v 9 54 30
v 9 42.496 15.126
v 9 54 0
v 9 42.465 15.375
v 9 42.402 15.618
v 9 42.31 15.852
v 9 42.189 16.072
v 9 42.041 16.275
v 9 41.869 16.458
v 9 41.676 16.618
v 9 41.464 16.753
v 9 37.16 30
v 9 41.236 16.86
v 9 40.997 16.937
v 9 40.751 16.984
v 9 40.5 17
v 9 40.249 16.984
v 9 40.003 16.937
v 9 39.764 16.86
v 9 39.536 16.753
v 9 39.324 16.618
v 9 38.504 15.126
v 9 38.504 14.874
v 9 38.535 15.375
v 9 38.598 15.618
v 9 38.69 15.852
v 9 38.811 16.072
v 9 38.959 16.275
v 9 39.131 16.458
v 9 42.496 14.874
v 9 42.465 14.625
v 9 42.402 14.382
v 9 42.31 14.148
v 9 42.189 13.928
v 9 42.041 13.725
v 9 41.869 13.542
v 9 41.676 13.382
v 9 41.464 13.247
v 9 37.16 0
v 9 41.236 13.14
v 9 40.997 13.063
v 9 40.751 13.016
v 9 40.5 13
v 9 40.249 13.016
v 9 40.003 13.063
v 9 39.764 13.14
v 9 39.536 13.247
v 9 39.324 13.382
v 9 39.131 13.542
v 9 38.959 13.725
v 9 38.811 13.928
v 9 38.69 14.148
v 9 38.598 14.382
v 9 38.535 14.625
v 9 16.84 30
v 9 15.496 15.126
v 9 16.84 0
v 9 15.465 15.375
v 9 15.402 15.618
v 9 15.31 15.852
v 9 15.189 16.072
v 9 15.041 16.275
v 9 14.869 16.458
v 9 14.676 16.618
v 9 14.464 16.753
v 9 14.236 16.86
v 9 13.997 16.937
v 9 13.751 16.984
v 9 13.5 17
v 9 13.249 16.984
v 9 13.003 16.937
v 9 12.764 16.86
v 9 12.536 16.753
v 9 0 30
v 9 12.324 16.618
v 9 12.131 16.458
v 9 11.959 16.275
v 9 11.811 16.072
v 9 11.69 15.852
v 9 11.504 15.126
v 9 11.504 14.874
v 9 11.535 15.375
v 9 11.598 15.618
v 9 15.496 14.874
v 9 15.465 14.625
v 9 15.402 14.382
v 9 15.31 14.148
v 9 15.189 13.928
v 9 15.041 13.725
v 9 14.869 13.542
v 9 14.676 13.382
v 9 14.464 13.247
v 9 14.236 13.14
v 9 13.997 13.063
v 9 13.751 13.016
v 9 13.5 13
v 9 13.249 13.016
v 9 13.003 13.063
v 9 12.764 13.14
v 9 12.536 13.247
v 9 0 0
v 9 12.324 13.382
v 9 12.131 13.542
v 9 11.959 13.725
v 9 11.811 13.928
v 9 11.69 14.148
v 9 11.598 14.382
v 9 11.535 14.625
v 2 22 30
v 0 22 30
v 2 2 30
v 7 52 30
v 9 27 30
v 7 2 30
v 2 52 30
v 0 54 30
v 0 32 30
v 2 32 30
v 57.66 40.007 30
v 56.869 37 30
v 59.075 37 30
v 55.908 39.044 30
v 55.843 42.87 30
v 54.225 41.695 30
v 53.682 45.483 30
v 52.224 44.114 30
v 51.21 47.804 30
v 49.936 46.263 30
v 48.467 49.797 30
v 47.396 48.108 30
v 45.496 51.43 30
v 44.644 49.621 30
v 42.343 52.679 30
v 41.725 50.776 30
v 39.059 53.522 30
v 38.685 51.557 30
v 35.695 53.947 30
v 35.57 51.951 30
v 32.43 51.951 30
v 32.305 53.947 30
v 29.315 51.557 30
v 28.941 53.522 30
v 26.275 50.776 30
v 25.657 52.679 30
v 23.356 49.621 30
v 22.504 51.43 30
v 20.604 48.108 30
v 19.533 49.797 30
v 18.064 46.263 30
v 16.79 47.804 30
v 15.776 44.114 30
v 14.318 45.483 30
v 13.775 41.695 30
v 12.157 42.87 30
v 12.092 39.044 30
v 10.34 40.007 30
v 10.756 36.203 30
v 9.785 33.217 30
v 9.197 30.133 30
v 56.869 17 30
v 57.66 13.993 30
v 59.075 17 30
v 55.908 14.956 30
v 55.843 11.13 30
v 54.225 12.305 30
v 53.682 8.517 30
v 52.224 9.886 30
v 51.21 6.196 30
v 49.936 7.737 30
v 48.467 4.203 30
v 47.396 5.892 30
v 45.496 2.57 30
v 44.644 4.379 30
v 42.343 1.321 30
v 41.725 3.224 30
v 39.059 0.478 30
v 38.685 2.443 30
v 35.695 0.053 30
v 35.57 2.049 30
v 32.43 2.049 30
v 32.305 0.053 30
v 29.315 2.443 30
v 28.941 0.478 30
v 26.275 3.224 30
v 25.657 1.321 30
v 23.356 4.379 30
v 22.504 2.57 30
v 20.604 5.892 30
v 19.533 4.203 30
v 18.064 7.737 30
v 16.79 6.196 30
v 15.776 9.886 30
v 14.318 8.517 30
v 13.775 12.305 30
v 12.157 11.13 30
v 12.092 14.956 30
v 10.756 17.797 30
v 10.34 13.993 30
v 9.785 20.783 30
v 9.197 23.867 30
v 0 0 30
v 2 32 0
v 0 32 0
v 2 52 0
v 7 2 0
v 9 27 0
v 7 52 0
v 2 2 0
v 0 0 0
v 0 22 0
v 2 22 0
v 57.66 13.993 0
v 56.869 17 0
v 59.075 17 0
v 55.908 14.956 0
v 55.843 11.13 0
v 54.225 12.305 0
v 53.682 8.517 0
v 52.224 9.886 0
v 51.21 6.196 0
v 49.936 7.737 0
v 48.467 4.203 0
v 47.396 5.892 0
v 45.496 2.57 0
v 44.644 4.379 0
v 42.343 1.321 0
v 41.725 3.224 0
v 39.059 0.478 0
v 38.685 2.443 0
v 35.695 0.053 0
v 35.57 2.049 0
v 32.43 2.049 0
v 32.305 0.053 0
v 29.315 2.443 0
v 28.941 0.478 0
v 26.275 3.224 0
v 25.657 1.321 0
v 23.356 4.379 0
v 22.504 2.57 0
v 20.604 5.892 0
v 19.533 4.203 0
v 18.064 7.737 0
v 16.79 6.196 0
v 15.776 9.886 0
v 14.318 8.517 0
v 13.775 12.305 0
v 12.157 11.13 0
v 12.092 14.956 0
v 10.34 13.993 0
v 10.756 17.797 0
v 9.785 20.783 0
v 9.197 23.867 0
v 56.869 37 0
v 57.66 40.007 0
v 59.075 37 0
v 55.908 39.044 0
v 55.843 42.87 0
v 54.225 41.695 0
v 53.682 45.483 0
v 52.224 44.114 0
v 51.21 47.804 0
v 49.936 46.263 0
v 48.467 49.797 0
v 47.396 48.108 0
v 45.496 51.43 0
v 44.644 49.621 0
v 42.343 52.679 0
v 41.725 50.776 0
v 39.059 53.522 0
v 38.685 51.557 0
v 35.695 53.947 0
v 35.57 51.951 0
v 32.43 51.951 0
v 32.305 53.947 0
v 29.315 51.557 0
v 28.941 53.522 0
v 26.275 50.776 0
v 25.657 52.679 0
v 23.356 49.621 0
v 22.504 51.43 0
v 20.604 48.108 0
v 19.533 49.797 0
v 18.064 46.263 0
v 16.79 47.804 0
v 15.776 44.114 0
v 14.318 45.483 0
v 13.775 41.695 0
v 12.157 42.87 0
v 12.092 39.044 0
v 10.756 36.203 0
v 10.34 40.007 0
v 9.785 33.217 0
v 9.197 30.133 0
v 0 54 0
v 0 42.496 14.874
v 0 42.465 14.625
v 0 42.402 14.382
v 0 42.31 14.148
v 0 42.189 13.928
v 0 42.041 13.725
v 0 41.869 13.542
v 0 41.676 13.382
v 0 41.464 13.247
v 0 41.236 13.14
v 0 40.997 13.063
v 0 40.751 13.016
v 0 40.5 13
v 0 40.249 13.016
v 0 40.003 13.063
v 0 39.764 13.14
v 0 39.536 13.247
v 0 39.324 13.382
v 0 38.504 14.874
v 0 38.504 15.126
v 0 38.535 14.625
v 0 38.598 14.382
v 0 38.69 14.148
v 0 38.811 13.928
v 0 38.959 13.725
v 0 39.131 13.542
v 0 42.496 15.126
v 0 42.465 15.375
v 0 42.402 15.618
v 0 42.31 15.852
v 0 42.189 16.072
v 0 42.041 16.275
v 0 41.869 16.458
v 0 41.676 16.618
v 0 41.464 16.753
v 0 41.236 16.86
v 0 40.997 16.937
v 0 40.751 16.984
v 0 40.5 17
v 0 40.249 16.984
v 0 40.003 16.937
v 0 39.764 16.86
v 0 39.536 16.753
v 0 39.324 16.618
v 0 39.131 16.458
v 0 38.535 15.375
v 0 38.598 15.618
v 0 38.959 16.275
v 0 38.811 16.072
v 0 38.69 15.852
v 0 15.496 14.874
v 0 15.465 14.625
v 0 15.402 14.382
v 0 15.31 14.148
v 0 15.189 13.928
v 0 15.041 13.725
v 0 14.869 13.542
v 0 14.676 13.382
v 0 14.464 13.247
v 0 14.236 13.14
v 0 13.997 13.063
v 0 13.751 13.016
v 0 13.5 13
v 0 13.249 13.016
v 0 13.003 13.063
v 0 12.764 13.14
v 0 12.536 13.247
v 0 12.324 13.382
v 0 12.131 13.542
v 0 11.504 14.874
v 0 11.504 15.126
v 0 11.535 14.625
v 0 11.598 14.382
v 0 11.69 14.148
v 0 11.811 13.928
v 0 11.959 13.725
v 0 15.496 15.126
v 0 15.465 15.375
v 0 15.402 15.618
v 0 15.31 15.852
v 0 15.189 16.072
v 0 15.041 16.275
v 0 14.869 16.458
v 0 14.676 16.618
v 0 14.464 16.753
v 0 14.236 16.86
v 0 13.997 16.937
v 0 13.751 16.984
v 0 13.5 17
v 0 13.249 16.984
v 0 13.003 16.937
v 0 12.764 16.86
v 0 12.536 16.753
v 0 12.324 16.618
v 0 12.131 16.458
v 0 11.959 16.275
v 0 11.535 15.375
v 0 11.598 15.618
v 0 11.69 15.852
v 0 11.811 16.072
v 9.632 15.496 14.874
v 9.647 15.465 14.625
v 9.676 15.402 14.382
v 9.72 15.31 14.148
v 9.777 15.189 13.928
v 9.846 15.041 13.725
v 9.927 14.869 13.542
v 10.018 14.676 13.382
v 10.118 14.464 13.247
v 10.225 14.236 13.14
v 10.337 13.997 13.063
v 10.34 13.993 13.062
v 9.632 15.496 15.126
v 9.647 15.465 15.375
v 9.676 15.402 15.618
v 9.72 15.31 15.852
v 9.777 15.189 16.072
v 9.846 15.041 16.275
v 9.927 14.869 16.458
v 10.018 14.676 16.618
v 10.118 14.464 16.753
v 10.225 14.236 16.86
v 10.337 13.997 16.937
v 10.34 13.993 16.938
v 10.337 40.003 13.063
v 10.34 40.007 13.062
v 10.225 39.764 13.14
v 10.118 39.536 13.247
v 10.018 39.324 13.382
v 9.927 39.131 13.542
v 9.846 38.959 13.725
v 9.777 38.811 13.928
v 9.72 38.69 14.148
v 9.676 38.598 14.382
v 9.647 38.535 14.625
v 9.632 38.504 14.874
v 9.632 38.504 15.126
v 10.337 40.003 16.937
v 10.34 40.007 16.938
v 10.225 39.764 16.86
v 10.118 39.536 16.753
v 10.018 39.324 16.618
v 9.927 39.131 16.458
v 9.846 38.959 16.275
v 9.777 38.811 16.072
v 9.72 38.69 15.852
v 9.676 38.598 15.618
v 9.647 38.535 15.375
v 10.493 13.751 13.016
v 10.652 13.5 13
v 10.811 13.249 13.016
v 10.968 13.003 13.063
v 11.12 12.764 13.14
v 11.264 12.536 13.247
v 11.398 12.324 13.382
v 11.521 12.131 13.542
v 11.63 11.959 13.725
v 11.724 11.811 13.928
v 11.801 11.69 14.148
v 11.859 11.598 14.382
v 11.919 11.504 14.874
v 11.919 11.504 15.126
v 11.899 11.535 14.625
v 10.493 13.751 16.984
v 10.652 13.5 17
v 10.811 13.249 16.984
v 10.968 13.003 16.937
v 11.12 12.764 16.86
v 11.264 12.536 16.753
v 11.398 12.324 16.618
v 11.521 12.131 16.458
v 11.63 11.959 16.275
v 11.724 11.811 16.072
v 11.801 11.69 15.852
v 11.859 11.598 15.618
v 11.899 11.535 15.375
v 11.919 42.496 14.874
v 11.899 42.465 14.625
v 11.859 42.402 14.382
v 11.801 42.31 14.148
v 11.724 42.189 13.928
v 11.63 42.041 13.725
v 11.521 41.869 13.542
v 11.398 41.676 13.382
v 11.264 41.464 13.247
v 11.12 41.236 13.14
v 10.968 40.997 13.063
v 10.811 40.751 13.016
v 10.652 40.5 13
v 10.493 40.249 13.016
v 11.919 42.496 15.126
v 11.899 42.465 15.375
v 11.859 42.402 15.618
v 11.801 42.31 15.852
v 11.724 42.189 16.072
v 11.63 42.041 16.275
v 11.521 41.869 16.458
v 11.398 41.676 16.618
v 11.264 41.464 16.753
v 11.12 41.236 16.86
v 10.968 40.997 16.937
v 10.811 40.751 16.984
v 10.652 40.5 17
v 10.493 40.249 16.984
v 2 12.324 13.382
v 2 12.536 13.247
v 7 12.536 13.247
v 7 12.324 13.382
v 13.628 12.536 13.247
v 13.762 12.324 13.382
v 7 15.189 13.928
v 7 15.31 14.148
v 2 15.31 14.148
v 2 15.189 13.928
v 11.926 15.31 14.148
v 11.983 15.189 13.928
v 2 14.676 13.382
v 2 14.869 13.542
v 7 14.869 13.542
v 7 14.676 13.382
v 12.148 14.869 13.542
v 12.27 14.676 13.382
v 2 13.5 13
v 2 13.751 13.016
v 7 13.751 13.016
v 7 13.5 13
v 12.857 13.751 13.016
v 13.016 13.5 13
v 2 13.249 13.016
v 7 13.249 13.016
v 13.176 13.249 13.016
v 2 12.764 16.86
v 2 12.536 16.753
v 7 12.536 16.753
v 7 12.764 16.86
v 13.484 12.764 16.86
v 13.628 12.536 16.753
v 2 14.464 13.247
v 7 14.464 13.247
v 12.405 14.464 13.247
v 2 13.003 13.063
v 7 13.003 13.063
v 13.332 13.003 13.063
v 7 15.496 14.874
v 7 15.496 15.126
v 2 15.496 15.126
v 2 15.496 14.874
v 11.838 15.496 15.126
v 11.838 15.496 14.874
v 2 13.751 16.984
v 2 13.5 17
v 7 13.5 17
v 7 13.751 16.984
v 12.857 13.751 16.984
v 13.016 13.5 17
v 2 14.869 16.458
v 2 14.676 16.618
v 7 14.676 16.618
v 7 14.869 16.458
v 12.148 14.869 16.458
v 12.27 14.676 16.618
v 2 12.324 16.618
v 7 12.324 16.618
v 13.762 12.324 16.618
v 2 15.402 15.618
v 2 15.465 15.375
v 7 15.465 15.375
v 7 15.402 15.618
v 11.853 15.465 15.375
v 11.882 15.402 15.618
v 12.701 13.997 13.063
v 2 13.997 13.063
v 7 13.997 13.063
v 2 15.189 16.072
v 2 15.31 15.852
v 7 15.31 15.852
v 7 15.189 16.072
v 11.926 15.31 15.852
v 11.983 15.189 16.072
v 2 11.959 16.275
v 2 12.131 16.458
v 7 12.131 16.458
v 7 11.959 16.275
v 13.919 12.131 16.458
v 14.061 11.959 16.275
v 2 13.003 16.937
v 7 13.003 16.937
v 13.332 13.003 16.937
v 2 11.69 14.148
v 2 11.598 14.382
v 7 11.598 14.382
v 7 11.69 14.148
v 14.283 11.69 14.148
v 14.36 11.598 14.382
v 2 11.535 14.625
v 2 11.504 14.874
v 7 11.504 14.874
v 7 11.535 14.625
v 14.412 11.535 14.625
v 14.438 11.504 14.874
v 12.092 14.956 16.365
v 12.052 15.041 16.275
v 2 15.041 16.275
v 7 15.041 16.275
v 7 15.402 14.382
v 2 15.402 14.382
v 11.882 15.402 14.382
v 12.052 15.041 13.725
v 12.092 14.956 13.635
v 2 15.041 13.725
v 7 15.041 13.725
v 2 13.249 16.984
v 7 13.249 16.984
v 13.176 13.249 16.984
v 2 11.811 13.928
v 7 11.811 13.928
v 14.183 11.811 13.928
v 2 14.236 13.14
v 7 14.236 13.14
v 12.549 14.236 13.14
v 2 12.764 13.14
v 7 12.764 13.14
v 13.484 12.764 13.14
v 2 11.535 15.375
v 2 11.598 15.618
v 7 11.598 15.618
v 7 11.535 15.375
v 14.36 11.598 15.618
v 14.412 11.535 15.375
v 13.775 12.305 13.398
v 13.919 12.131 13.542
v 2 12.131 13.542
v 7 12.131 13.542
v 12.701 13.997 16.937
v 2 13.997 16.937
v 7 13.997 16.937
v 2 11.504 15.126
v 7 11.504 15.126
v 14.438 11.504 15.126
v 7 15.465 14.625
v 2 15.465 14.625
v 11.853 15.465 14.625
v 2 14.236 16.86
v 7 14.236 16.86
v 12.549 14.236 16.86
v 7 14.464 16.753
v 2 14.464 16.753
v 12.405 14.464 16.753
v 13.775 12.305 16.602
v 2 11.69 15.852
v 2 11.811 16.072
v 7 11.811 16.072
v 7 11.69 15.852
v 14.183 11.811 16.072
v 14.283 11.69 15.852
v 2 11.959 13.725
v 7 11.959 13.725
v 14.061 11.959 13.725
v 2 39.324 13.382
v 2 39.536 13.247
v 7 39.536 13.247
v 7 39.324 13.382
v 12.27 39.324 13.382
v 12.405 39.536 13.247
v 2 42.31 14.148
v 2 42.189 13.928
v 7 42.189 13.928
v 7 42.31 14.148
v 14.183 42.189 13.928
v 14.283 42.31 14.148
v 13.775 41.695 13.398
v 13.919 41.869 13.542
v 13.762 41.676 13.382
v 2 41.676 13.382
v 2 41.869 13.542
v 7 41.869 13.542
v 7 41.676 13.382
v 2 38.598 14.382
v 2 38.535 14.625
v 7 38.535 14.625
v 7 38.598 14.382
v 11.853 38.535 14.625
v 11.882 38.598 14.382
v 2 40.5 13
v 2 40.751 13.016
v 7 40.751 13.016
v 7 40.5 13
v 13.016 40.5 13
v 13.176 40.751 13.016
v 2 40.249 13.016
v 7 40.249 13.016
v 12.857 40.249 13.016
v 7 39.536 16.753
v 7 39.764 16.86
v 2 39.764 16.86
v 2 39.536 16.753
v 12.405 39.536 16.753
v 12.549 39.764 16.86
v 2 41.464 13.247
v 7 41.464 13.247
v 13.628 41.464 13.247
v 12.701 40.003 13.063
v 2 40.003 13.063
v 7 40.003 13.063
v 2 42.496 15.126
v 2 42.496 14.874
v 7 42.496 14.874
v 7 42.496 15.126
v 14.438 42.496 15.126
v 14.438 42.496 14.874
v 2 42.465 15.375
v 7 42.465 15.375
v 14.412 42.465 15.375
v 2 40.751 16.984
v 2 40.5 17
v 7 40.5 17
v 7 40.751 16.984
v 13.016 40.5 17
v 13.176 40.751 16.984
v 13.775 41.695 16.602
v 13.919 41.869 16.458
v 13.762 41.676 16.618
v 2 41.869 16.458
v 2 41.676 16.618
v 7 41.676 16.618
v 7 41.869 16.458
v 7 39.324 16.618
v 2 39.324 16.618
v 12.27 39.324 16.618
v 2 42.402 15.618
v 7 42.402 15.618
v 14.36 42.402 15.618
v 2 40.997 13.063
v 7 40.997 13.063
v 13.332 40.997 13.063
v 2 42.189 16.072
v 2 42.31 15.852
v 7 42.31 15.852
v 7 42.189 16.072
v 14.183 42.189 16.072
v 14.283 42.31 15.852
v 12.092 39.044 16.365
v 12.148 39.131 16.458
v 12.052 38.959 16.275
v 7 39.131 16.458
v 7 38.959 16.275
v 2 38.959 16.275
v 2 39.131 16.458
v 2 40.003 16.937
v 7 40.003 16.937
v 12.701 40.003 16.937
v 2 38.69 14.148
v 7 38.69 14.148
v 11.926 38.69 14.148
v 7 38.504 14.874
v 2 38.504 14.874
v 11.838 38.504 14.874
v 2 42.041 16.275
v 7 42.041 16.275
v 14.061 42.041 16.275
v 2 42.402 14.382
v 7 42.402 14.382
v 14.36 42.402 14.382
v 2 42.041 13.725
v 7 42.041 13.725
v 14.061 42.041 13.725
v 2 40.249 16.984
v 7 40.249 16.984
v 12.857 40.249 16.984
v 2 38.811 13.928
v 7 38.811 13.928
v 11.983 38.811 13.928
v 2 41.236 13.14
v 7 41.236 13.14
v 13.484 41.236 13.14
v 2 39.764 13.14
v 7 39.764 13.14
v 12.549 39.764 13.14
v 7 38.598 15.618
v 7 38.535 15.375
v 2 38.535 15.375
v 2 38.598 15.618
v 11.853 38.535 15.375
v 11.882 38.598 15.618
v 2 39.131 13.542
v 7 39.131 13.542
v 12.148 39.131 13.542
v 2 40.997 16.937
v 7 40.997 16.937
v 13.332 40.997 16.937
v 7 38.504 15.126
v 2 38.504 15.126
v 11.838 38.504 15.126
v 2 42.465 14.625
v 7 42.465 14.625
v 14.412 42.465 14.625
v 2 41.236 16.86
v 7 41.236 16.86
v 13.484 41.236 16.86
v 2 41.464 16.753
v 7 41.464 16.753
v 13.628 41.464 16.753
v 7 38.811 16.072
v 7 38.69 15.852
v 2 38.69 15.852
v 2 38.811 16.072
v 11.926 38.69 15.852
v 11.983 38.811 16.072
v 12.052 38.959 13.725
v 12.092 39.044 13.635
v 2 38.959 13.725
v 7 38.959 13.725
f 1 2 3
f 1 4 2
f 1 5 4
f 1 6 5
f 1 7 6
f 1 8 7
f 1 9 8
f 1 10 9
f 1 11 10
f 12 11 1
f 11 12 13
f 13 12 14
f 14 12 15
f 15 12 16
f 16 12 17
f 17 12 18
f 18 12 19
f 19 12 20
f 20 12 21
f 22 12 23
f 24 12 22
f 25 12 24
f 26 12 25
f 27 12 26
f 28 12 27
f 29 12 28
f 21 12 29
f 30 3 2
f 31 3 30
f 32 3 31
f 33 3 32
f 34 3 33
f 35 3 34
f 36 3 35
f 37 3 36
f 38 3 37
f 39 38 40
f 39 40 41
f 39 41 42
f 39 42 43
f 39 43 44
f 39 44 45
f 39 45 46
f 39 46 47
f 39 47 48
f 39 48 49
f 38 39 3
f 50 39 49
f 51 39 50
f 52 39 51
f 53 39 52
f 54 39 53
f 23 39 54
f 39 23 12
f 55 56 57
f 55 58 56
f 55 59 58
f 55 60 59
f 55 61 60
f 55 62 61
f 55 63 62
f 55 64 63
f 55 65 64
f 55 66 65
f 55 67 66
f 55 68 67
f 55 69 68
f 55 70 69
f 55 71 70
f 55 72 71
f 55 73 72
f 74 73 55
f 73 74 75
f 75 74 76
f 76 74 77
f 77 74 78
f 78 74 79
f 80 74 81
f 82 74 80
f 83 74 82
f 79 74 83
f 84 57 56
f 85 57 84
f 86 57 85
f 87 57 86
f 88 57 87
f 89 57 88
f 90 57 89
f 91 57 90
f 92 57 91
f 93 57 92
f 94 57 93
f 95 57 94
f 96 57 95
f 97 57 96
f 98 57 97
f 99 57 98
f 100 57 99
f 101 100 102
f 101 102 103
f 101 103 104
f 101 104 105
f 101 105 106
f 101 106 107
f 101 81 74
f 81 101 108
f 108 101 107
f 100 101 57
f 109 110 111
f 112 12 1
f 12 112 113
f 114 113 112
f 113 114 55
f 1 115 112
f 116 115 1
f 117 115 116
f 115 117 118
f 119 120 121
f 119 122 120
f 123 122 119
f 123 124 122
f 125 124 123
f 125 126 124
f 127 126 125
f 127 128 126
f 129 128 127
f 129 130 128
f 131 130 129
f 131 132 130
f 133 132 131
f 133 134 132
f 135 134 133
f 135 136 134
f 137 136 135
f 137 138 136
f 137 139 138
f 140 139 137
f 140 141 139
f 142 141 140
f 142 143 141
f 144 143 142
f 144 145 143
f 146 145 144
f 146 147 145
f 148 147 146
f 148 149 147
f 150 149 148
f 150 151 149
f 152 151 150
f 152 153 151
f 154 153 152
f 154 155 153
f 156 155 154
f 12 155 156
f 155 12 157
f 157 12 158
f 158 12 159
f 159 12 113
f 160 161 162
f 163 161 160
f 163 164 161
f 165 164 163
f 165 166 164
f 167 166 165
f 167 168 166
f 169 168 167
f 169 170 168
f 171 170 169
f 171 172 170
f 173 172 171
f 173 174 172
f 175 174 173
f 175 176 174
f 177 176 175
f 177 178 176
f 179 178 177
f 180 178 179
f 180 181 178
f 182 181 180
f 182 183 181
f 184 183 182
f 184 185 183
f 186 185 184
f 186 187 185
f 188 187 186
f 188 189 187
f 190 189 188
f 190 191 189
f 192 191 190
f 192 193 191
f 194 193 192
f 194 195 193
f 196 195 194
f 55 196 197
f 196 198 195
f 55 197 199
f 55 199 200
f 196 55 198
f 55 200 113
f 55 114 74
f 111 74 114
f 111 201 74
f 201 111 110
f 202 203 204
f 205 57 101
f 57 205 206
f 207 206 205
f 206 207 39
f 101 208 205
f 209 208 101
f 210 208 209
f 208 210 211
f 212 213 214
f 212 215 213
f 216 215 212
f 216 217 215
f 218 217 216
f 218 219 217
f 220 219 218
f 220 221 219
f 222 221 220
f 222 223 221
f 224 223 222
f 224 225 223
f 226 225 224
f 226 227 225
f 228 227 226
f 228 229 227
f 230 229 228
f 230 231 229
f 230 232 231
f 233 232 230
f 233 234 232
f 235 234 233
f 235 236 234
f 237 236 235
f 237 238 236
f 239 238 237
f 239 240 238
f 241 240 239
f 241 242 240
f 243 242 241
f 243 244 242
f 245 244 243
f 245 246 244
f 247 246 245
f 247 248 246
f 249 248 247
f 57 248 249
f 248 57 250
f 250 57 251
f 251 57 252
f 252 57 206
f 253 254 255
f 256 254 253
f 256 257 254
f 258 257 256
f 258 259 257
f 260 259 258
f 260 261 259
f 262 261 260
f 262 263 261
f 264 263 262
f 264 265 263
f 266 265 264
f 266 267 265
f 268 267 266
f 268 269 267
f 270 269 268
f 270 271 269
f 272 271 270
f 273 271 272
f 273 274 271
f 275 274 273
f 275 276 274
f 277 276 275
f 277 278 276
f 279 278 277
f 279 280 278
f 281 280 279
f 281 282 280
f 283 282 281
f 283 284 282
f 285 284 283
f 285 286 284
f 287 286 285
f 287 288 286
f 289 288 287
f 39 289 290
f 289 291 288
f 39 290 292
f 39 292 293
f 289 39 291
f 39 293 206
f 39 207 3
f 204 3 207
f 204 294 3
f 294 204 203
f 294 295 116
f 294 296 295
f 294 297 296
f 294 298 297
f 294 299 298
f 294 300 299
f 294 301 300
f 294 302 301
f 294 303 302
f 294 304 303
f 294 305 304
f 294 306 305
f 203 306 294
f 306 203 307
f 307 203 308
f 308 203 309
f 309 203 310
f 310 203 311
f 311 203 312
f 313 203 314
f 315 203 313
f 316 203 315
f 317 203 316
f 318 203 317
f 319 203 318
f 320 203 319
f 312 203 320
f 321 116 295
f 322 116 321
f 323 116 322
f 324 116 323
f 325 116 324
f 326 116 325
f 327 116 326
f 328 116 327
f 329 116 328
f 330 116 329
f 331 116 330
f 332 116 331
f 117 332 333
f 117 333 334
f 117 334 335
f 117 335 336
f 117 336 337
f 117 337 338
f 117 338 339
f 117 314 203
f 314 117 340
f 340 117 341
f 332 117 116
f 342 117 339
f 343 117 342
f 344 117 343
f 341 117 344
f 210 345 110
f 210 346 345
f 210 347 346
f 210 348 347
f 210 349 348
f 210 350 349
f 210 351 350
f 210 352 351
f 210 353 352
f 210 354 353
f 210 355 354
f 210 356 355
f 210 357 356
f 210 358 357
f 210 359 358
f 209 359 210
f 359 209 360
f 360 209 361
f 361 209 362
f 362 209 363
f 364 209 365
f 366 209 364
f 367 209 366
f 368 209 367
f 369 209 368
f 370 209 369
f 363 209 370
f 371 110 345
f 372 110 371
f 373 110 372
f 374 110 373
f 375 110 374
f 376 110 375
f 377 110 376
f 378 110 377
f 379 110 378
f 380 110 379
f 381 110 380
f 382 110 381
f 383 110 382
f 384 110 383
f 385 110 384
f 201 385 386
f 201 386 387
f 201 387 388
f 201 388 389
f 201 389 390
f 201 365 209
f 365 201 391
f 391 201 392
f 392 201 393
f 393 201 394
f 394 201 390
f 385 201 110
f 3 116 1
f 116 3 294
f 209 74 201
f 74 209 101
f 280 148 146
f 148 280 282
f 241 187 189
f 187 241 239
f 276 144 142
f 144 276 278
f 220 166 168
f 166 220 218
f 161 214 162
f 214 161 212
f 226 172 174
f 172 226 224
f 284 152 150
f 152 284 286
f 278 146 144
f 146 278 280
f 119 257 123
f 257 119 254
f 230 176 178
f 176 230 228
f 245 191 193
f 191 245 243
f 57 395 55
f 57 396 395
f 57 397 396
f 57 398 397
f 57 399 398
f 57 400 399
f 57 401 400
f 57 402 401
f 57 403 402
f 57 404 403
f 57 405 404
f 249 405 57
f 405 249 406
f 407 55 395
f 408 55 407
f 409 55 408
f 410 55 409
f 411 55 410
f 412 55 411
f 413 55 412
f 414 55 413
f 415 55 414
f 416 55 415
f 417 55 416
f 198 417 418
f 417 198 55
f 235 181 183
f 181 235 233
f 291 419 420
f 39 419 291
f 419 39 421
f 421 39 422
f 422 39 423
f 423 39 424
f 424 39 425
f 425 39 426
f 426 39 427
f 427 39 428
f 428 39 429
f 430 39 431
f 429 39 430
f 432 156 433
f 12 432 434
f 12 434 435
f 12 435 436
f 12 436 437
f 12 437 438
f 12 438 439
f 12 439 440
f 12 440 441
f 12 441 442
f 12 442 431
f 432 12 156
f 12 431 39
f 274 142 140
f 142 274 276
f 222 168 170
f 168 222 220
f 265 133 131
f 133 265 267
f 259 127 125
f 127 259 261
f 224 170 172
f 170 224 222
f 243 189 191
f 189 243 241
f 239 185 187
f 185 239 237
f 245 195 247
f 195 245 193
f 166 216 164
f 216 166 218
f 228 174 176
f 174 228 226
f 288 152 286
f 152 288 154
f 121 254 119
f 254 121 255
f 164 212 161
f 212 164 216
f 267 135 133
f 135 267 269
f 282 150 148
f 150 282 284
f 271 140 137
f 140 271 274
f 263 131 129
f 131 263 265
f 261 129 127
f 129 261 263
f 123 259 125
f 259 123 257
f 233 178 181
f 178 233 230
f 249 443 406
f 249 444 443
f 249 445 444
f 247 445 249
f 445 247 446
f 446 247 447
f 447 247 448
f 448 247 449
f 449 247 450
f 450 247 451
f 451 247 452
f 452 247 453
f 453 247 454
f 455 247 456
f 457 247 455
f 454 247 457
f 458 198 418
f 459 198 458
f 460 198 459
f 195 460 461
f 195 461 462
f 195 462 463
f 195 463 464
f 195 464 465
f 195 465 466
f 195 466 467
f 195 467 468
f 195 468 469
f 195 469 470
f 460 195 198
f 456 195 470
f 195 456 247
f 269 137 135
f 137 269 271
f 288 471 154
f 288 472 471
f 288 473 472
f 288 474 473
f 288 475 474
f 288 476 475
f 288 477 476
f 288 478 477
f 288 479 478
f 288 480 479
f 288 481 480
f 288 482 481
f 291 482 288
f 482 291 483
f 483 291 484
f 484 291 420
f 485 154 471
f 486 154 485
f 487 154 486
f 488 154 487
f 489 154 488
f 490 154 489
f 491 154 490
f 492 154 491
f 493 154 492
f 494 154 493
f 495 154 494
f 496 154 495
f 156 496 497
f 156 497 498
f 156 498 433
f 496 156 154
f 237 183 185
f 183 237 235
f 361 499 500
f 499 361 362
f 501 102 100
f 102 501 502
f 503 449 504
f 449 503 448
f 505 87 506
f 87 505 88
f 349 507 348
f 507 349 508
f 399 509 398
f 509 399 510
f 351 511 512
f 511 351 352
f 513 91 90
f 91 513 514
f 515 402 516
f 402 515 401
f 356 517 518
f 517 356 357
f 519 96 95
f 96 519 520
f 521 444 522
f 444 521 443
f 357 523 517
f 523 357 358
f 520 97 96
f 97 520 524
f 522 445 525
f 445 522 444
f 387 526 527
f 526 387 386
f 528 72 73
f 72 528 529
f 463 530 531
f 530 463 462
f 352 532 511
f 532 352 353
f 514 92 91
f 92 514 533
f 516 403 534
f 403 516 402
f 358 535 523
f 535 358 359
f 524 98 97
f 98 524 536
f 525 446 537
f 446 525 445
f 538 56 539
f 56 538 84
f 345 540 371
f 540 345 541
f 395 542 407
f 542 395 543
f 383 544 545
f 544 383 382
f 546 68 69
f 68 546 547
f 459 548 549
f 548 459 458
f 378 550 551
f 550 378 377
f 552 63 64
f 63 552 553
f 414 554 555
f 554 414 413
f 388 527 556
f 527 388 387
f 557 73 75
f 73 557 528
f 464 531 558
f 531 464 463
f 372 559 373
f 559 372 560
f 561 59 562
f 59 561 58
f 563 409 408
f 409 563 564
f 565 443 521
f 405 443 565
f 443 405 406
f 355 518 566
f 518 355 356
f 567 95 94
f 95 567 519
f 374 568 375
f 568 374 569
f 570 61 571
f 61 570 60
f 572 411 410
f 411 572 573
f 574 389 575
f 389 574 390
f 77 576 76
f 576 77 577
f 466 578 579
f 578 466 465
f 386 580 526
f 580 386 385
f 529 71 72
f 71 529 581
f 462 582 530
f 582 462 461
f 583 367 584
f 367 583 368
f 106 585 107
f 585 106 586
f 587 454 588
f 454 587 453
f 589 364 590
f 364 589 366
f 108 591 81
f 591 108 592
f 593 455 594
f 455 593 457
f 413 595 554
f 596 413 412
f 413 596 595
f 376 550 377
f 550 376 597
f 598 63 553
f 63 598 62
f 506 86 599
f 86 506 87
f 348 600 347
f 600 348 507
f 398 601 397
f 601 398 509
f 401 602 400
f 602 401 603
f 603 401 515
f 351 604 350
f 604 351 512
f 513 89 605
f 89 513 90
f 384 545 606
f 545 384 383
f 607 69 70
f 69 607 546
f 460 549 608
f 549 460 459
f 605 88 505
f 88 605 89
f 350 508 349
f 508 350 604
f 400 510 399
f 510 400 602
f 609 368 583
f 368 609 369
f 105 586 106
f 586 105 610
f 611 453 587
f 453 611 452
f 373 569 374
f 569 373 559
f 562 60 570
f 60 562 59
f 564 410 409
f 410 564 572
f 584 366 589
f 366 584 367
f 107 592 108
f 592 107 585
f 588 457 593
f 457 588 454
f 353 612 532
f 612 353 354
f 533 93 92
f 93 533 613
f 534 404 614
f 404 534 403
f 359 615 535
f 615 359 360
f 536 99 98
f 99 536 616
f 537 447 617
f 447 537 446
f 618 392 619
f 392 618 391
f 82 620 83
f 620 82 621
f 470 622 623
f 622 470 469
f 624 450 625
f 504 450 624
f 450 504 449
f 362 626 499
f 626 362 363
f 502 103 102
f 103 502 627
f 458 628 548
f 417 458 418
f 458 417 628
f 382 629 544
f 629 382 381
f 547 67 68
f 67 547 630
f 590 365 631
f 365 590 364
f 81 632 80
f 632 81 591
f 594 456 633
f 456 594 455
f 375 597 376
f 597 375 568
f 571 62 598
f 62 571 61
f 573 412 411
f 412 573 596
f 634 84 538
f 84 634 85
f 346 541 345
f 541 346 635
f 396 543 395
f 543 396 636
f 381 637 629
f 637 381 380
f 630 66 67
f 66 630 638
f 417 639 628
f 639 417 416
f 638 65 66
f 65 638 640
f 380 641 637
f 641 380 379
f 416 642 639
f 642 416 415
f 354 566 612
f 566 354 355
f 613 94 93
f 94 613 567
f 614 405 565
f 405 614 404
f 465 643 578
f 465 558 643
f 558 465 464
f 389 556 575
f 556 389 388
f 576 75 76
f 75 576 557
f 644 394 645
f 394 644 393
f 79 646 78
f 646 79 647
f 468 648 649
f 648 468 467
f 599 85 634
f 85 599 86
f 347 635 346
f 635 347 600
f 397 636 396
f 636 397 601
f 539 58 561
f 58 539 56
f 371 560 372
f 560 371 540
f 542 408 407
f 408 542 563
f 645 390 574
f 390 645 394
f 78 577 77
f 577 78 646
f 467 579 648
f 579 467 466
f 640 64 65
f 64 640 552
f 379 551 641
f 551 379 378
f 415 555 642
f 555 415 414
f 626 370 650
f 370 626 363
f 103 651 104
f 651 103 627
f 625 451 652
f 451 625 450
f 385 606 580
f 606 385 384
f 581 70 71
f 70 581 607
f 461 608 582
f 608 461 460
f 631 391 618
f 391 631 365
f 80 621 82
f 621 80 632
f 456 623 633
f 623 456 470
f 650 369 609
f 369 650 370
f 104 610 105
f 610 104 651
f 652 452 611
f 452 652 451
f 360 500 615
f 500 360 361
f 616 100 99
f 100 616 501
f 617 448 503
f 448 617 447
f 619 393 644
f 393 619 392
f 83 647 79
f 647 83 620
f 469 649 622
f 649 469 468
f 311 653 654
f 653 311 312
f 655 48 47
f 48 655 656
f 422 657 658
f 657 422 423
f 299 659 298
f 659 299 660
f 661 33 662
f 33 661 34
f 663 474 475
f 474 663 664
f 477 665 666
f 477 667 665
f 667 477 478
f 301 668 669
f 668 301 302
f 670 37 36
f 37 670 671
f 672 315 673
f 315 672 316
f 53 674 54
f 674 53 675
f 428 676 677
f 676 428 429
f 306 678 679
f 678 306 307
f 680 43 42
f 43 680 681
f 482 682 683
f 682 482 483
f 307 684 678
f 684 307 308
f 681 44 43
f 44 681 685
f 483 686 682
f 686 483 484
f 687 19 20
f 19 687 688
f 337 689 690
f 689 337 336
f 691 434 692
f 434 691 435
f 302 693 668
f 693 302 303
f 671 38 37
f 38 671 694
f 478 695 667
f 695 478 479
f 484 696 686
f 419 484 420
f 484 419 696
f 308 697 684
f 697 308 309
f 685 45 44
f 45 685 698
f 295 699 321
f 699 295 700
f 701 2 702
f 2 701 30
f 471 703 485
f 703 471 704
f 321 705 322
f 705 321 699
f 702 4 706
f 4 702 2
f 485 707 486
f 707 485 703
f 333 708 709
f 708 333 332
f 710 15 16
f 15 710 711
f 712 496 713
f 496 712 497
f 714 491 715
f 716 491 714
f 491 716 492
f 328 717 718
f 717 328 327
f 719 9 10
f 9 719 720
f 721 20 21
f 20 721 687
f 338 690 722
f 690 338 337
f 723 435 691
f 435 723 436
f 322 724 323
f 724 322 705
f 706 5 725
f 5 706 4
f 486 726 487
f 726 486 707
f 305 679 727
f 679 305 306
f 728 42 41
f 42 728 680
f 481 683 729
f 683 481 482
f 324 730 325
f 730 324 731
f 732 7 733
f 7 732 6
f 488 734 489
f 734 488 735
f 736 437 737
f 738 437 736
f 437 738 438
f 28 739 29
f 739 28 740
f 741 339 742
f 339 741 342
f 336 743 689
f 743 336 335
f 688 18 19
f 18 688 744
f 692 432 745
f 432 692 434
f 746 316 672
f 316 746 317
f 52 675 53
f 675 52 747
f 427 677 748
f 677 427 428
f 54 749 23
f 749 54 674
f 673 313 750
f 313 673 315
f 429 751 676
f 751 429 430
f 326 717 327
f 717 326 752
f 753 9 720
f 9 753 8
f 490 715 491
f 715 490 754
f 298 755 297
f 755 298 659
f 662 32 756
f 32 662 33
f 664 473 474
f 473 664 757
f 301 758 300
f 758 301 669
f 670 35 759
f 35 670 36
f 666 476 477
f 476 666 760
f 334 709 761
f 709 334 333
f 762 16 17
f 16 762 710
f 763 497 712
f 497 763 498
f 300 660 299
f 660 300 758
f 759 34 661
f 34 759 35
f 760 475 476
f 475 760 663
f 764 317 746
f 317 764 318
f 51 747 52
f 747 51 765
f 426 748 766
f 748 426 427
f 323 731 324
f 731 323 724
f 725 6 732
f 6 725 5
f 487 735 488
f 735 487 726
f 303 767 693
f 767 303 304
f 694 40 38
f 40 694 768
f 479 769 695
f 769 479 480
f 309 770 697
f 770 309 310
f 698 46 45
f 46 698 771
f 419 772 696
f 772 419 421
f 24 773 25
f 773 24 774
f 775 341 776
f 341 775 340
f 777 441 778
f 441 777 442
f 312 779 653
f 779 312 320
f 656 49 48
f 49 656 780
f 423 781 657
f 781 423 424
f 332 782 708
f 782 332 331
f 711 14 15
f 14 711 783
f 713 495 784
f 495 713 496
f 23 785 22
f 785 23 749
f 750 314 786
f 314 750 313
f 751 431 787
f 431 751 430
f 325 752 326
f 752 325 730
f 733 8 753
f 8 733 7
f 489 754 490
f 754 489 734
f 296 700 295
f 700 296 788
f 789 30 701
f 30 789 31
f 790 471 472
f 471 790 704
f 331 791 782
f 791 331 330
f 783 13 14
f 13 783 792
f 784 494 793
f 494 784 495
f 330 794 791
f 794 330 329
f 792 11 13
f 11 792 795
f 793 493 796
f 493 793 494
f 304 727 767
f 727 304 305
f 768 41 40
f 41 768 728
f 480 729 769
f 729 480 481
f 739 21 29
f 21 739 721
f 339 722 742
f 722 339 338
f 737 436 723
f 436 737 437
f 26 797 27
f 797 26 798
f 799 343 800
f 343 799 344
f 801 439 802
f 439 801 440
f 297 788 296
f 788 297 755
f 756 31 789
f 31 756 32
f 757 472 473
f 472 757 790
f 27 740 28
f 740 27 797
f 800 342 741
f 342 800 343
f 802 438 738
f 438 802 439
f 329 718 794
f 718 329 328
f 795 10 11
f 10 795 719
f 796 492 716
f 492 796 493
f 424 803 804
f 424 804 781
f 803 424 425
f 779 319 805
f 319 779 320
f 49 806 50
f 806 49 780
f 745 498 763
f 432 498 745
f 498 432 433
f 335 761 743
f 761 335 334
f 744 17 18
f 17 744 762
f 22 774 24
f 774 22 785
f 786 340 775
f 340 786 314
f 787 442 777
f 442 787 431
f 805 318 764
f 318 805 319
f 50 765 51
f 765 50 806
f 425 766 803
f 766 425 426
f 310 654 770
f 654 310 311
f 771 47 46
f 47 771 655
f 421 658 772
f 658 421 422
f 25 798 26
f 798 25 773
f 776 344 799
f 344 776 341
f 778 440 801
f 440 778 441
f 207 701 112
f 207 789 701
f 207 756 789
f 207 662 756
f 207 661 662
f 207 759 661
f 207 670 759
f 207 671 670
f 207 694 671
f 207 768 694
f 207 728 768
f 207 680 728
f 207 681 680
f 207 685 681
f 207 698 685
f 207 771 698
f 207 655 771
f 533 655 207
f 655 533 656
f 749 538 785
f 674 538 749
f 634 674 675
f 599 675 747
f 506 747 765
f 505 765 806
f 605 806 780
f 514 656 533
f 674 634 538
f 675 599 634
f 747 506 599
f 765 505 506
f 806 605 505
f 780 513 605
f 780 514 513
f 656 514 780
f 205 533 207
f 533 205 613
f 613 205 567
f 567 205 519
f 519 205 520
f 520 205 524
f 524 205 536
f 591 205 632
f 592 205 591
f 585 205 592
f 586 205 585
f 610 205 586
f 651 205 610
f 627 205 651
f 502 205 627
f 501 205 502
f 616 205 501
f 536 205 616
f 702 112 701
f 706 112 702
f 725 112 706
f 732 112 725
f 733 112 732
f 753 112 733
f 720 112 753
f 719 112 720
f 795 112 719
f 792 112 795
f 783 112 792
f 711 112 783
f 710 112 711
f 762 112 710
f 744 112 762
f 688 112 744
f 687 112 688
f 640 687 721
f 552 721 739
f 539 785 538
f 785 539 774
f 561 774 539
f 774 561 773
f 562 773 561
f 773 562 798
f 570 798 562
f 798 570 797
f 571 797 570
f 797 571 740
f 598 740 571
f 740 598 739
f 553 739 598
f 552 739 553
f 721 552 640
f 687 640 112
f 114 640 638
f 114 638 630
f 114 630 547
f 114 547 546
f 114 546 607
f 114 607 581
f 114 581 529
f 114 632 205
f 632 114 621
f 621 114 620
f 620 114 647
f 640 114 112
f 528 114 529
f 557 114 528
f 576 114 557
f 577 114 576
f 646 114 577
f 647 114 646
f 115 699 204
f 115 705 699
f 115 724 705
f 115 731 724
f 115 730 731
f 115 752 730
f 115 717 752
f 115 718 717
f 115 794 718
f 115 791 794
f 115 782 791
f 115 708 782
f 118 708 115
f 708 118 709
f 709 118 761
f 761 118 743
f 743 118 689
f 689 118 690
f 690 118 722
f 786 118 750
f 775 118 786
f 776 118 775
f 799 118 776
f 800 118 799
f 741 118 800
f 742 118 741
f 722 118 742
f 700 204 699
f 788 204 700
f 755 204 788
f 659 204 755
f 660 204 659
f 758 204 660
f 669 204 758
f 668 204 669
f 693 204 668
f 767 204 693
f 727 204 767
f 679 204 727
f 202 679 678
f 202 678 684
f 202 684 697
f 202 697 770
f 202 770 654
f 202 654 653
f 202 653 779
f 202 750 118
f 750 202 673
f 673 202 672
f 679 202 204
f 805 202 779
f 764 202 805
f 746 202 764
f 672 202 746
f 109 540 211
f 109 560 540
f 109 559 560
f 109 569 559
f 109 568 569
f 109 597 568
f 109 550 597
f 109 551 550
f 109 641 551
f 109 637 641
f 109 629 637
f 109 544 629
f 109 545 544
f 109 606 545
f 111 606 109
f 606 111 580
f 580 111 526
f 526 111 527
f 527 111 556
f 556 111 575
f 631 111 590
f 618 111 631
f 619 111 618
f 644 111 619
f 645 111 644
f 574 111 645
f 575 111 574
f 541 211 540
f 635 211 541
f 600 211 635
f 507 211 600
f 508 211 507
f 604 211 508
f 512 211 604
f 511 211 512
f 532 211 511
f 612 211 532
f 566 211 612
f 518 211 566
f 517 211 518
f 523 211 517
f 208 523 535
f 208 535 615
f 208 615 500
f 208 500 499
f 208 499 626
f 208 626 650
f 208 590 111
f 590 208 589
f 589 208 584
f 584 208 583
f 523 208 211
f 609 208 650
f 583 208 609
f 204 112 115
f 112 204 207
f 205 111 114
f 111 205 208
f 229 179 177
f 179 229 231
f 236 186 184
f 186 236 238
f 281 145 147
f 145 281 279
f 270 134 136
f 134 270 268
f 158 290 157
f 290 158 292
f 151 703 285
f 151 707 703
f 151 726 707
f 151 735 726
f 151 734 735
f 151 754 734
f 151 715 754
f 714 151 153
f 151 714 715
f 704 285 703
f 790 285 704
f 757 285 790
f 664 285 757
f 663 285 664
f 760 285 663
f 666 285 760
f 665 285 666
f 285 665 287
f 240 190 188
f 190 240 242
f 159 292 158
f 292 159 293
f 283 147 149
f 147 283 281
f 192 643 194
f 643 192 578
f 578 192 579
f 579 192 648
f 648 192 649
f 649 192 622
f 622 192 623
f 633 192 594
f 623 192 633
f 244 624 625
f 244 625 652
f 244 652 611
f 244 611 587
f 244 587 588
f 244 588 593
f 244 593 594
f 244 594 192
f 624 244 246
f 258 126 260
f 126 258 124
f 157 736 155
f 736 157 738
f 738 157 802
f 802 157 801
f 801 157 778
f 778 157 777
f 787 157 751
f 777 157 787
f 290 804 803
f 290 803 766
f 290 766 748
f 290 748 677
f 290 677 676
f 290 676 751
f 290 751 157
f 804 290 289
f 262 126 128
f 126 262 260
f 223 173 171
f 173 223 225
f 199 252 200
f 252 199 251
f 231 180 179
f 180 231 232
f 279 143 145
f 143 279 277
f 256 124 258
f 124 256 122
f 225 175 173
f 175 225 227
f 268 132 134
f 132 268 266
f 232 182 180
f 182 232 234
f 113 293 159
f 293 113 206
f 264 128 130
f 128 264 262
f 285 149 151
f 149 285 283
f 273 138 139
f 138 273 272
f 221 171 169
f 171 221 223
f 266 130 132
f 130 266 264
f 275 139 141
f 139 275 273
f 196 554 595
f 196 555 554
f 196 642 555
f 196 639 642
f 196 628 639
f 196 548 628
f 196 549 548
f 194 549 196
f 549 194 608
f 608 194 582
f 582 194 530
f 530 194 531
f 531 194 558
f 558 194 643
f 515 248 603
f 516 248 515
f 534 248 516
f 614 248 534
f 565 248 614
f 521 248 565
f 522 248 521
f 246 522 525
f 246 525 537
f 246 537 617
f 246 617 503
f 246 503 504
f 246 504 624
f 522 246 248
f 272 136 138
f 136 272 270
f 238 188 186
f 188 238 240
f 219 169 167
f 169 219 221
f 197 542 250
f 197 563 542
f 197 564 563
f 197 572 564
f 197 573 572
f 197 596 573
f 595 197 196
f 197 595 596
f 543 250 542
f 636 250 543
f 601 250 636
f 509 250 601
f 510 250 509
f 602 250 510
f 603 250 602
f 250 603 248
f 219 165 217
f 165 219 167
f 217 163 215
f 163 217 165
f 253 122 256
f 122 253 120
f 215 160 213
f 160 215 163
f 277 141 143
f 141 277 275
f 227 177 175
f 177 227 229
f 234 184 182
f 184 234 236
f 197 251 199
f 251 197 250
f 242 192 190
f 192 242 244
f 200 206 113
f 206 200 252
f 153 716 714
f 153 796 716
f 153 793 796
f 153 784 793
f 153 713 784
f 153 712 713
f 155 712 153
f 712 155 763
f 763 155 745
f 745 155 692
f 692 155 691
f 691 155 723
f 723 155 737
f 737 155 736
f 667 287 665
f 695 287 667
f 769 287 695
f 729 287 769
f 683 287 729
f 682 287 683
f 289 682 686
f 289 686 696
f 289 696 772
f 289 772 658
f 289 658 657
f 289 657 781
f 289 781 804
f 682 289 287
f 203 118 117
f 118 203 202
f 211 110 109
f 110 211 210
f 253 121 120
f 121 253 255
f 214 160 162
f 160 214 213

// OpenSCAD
// Tube diameter (mm)
tubeRadius = 25;

// Rectangular slot depth (mm)
slotDepth = 5;

// Rectangular slot width (mm)
slotWidth = 50;

// Total height (mm)
height = 30;

// Wall thickness (mm)
wallThickness = 2;

// Width of gap at the back of the rectangular slot (mm)
slotGap = 10;

// Width of gap at the front of the tube (mm)
tubeGap = 20;

// Mounting hole count
numHoles = 2;

// Mounting hole diemeters (mm)
holeDiameter = 4;

module tripodclamp()
{
	difference() {
		// Main body
			union(){
			cube([slotDepth + (2*wallThickness)
					, slotWidth + (2*wallThickness)
					, height], center = false);	
			translate([tubeRadius + slotDepth + (wallThickness*2)
							,((slotWidth + (wallThickness*2))/2)
							,0])
				cylinder(h=height
							,r=tubeRadius + wallThickness
							,$fn=50);
			}

		// Subractions
			// Belt slot
		translate([wallThickness,wallThickness,-0.1]) 
			cube([slotDepth, slotWidth, height+0.2], centre = false);

			// Tube
		translate([tubeRadius + slotDepth + (wallThickness*2)
							,((slotWidth + (wallThickness*2))/2)
							,-0.1])
			cylinder(h=height + 0.2,r=tubeRadius, $fn=50);
		
			// Belt slot gap
		translate([-0.1,((slotWidth + 2*wallThickness)/2)-slotGap/2,-0.1]) 
			cube([wallThickness + 0.2, slotGap, height + 0.2], centre = false);
		
			// Tube slot gap
		translate([2*tubeRadius + slotDepth + 2.5*wallThickness - (tubeGap/2)
					,((slotWidth + 2*wallThickness)/2)-tubeGap/2
					,-0.1]) 
			cube([tubeGap, tubeGap, height + 0.2], centre = false);

			// Mounting holes
		if(numHoles>1){
			// Distribute the holes across the base
			delta = ((slotWidth + 2*wallThickness)/(numHoles))/2;
			for(y=[0:numHoles-1]){				
				if(y==0){
					translate([-0.1,((slotWidth + 2*wallThickness)/(numHoles))/2,height/2])
						rotate([0,90,0]){
							cylinder(h=slotDepth + 2*wallThickness + 10
										,r=holeDiameter/2
										,$fn=50);
						}	
				} else {
					translate([-0.1,(y*(slotWidth + 2*wallThickness)/(numHoles))+delta,height/2])
						rotate([0,90,0]){
							cylinder(h=slotDepth + 2*wallThickness + 10
										,r=holeDiameter/2
										,$fn=50);	  	
						}
				}
			}
		} else {
			if(numHoles==1){
				// centre the hole right through the base
				translate([-0.1,((slotWidth + 2*wallThickness)/2),height/2])
					rotate([0,90,0]){
						cylinder(h=slotDepth + 2*wallThickness + 20
								,r=holeDiameter/2
								,$fn=50);	  	
					}
			}
		}
	}

}

tripodclamp();
